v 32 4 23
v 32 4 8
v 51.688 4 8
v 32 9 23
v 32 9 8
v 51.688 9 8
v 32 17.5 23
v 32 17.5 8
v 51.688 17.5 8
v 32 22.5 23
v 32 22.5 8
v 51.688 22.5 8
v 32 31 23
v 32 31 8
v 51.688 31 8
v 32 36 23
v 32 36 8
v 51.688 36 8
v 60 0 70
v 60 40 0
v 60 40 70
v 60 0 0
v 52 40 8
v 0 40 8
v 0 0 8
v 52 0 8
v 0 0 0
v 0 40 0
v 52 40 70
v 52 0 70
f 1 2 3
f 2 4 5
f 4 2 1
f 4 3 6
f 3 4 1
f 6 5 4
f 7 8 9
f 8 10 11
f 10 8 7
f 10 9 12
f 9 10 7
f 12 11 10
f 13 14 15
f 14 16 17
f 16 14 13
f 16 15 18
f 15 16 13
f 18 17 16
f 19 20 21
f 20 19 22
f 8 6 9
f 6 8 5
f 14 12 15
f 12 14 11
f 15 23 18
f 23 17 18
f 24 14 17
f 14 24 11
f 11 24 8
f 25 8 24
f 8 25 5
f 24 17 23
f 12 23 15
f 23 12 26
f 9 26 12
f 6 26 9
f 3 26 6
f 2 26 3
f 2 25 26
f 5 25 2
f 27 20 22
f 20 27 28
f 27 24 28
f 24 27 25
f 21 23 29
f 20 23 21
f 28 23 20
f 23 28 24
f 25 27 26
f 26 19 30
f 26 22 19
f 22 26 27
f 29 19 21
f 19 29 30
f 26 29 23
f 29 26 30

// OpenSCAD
$fn = 32;

// ----------------------------------------------------------------------
// Rib bracket: 3-gusset L bracket
// ----------------------------------------------------------------------

// --- parameters (mm) ---
base_l = 60;              // foot length, X
base_w = 40;              // foot width, Y
base_t = 8;               // foot thickness
plate_t = 8;              // upright plate thickness
plate_h = 70;             // overall height
gus_l = 20;               // gusset leg along the foot
gus_h = 16;               // gusset height
gus_t = 5;                // gusset thickness
gus_edge = 4;             // gusset margin from the foot edge
n_gus = 3;                // gusset count

gus_pitch = (base_w - 2 * gus_edge - gus_t) / (n_gus - 1);  // gusset pitch

union() {
  cube([base_l, base_w, base_t]);
  translate([base_l - plate_t, 0, base_t - 1])
    cube([plate_t, base_w, plate_h - base_t + 1]);
  for (i = [0 : n_gus - 1])
    translate([base_l - plate_t - gus_l, gus_edge + i * gus_pitch, base_t - 1])
      rotate([-90, 0, 0])
        linear_extrude(height = gus_t)
          polygon(points = [[0, 0], [gus_l + 1, 0], [0, -gus_h]]);
}
